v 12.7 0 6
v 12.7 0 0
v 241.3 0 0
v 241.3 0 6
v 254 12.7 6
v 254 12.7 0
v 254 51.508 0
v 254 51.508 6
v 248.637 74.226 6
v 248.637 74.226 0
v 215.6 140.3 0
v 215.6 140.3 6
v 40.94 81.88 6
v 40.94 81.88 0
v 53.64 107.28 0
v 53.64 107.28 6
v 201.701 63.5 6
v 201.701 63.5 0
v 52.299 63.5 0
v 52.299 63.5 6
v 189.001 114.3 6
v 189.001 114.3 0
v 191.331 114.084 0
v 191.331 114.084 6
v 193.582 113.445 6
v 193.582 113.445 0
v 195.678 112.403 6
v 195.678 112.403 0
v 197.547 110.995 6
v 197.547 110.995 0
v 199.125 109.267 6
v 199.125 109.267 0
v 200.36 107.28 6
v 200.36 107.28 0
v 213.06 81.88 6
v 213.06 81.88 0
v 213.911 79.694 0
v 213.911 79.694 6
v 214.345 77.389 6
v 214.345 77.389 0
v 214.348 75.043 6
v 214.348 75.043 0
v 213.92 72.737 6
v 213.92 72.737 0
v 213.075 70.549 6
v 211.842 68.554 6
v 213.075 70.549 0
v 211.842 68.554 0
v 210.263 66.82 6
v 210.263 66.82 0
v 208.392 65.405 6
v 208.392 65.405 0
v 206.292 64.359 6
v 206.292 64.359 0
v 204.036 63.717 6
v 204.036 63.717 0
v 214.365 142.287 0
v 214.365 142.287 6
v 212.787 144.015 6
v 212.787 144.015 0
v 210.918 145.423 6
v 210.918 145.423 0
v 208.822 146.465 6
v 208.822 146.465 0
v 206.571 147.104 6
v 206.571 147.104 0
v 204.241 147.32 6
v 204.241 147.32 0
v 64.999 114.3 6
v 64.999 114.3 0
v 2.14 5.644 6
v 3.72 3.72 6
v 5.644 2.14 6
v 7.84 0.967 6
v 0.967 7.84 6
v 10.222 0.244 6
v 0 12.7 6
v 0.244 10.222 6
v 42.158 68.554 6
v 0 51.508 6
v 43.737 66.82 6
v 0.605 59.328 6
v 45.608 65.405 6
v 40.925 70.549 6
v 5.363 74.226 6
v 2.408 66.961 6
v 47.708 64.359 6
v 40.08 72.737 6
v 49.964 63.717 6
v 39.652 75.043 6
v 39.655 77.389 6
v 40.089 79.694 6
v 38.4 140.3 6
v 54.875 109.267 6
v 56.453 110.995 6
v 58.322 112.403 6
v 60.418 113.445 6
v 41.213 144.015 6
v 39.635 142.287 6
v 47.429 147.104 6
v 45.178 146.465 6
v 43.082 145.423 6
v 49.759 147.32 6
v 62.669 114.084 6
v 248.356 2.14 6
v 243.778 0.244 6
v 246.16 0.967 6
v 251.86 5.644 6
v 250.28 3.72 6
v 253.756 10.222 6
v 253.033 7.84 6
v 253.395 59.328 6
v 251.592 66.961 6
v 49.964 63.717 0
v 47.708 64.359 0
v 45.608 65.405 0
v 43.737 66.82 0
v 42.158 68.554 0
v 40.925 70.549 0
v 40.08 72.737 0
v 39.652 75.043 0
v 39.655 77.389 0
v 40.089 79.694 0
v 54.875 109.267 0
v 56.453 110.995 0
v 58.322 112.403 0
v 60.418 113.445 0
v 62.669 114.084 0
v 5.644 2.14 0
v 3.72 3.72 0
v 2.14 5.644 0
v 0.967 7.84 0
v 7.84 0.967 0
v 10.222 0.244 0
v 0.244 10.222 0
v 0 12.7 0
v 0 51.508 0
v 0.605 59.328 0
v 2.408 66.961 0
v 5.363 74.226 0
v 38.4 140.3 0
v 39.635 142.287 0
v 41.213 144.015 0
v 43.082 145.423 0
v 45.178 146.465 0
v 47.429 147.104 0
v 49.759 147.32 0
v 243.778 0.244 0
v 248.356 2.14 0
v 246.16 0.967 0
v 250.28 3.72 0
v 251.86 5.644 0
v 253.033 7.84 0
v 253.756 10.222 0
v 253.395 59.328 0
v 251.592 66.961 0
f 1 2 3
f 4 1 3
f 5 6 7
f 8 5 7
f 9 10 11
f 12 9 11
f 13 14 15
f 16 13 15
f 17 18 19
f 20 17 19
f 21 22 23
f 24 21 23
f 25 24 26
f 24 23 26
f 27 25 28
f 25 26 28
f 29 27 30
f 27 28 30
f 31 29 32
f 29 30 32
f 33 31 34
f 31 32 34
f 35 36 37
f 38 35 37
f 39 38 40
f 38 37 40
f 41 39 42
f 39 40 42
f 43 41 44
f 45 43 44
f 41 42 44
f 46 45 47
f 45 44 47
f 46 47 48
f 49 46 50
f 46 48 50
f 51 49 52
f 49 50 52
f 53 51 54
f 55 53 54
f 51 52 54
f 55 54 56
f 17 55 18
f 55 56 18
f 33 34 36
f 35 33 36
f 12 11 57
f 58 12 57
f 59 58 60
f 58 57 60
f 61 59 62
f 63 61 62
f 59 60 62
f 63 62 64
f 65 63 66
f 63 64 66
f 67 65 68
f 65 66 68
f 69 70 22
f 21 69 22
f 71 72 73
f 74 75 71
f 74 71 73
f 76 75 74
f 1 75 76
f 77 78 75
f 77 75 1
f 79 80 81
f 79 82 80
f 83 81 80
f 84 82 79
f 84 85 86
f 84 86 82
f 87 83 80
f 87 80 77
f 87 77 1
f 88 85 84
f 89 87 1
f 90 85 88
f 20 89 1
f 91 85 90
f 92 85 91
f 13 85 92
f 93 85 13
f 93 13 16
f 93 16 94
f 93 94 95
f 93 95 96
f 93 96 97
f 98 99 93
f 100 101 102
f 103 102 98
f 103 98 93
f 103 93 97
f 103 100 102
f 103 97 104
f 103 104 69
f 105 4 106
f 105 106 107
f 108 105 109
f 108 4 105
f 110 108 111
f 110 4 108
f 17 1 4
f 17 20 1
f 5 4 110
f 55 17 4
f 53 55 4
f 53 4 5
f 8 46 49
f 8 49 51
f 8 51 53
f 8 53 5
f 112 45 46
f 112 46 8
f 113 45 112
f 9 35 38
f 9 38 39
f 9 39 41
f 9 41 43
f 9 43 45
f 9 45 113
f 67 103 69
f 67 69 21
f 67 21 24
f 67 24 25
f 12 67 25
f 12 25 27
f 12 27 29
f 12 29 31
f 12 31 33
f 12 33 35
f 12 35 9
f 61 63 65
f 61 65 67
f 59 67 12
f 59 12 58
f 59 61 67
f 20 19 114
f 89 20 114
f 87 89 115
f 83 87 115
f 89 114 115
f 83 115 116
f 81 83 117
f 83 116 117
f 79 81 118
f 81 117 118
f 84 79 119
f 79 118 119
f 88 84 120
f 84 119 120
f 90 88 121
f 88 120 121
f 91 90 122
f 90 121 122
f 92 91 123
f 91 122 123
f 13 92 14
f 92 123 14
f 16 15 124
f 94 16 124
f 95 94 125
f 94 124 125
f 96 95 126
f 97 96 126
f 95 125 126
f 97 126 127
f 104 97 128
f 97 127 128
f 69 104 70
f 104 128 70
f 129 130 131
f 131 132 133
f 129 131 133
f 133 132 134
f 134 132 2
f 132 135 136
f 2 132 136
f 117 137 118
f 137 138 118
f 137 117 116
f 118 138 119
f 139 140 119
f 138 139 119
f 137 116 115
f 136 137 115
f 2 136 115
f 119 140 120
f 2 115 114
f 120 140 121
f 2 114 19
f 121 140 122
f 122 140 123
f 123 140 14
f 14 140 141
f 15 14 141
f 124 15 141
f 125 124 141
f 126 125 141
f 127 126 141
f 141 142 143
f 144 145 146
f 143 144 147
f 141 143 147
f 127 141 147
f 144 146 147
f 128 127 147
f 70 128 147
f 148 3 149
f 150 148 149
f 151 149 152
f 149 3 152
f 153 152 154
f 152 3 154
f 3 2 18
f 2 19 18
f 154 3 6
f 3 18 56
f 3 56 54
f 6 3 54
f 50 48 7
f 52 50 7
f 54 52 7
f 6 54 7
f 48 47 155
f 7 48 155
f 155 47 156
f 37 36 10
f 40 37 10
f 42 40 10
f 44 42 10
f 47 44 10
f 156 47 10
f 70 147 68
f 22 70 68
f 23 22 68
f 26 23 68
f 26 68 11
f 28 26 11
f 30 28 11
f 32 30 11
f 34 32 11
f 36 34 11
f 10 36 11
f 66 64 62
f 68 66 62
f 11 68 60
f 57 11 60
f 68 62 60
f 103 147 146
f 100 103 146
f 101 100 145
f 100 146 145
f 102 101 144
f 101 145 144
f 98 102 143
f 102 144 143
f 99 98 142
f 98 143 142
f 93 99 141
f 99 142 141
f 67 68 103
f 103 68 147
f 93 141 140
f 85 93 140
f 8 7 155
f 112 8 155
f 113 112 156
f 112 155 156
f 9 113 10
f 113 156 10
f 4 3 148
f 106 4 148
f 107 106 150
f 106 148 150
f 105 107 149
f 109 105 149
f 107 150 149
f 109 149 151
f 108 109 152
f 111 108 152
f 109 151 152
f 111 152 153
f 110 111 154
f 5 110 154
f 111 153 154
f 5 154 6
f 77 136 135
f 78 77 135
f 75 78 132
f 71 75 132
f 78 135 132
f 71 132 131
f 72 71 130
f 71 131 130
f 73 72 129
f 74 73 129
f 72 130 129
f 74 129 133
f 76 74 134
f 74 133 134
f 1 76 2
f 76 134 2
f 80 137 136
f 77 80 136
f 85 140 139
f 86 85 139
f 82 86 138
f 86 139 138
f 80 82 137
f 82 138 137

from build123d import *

# Parameters (mm, degrees)
BOSS_EXTRUDE1_DEPTH = 6


with BuildPart() as part:
    # Sketch1 → Boss-Extrude1 (new body)
    with BuildSketch(Plane.XY):
        with BuildLine():
            Line((12.7, 0), (241.3, 0))
            ThreePointArc((241.3, 0), (250.280256121, 3.719743879), (254, 12.7))
            Line((254, 12.7), (254, 51.507746743))
            ThreePointArc((254, 51.507746743), (252.641048665, 63.179195107), (248.636901303, 74.226197394))
            Line((248.636901303, 74.226197394), (215.600193669, 140.299612663))
            ThreePointArc((215.600193669, 140.299612663), (210.917753467, 145.423265266), (204.240968343, 147.32))
            Line((204.240968343, 147.32), (49.759031657, 147.32))
            ThreePointArc((49.759031657, 147.32), (43.082246533, 145.423265266), (38.399806331, 140.299612663))
            Line((38.399806331, 140.299612663), (5.363098697, 74.226197394))
            ThreePointArc((5.363098697, 74.226197394), (1.358951335, 63.179195107), (0, 51.507746743))
            Line((0, 51.507746743), (0, 12.7))
            ThreePointArc((0, 12.7), (3.719743879, 3.719743879), (12.7, 0))
        make_face()
        with BuildLine():
            Line((40.939806331, 81.879612663), (53.639806331, 107.279612663))
            ThreePointArc((53.639806331, 107.279612663), (58.322246533, 112.403265266), (64.999031657, 114.3))
            Line((64.999031657, 114.3), (189.000968343, 114.3))
            ThreePointArc((189.000968343, 114.3), (195.677753467, 112.403265266), (200.360193669, 107.279612663))
            Line((200.360193669, 107.279612663), (213.060193669, 81.879612663))
            ThreePointArc((213.060193669, 81.879612663), (212.504233609, 69.523214876), (201.700968343, 63.5))
            Line((201.700968343, 63.5), (52.299031657, 63.5))
            ThreePointArc((52.299031657, 63.5), (41.495766391, 69.523214876), (40.939806331, 81.879612663))
        make_face(mode=Mode.SUBTRACT)
    extrude(amount=BOSS_EXTRUDE1_DEPTH)


solid = part.part
